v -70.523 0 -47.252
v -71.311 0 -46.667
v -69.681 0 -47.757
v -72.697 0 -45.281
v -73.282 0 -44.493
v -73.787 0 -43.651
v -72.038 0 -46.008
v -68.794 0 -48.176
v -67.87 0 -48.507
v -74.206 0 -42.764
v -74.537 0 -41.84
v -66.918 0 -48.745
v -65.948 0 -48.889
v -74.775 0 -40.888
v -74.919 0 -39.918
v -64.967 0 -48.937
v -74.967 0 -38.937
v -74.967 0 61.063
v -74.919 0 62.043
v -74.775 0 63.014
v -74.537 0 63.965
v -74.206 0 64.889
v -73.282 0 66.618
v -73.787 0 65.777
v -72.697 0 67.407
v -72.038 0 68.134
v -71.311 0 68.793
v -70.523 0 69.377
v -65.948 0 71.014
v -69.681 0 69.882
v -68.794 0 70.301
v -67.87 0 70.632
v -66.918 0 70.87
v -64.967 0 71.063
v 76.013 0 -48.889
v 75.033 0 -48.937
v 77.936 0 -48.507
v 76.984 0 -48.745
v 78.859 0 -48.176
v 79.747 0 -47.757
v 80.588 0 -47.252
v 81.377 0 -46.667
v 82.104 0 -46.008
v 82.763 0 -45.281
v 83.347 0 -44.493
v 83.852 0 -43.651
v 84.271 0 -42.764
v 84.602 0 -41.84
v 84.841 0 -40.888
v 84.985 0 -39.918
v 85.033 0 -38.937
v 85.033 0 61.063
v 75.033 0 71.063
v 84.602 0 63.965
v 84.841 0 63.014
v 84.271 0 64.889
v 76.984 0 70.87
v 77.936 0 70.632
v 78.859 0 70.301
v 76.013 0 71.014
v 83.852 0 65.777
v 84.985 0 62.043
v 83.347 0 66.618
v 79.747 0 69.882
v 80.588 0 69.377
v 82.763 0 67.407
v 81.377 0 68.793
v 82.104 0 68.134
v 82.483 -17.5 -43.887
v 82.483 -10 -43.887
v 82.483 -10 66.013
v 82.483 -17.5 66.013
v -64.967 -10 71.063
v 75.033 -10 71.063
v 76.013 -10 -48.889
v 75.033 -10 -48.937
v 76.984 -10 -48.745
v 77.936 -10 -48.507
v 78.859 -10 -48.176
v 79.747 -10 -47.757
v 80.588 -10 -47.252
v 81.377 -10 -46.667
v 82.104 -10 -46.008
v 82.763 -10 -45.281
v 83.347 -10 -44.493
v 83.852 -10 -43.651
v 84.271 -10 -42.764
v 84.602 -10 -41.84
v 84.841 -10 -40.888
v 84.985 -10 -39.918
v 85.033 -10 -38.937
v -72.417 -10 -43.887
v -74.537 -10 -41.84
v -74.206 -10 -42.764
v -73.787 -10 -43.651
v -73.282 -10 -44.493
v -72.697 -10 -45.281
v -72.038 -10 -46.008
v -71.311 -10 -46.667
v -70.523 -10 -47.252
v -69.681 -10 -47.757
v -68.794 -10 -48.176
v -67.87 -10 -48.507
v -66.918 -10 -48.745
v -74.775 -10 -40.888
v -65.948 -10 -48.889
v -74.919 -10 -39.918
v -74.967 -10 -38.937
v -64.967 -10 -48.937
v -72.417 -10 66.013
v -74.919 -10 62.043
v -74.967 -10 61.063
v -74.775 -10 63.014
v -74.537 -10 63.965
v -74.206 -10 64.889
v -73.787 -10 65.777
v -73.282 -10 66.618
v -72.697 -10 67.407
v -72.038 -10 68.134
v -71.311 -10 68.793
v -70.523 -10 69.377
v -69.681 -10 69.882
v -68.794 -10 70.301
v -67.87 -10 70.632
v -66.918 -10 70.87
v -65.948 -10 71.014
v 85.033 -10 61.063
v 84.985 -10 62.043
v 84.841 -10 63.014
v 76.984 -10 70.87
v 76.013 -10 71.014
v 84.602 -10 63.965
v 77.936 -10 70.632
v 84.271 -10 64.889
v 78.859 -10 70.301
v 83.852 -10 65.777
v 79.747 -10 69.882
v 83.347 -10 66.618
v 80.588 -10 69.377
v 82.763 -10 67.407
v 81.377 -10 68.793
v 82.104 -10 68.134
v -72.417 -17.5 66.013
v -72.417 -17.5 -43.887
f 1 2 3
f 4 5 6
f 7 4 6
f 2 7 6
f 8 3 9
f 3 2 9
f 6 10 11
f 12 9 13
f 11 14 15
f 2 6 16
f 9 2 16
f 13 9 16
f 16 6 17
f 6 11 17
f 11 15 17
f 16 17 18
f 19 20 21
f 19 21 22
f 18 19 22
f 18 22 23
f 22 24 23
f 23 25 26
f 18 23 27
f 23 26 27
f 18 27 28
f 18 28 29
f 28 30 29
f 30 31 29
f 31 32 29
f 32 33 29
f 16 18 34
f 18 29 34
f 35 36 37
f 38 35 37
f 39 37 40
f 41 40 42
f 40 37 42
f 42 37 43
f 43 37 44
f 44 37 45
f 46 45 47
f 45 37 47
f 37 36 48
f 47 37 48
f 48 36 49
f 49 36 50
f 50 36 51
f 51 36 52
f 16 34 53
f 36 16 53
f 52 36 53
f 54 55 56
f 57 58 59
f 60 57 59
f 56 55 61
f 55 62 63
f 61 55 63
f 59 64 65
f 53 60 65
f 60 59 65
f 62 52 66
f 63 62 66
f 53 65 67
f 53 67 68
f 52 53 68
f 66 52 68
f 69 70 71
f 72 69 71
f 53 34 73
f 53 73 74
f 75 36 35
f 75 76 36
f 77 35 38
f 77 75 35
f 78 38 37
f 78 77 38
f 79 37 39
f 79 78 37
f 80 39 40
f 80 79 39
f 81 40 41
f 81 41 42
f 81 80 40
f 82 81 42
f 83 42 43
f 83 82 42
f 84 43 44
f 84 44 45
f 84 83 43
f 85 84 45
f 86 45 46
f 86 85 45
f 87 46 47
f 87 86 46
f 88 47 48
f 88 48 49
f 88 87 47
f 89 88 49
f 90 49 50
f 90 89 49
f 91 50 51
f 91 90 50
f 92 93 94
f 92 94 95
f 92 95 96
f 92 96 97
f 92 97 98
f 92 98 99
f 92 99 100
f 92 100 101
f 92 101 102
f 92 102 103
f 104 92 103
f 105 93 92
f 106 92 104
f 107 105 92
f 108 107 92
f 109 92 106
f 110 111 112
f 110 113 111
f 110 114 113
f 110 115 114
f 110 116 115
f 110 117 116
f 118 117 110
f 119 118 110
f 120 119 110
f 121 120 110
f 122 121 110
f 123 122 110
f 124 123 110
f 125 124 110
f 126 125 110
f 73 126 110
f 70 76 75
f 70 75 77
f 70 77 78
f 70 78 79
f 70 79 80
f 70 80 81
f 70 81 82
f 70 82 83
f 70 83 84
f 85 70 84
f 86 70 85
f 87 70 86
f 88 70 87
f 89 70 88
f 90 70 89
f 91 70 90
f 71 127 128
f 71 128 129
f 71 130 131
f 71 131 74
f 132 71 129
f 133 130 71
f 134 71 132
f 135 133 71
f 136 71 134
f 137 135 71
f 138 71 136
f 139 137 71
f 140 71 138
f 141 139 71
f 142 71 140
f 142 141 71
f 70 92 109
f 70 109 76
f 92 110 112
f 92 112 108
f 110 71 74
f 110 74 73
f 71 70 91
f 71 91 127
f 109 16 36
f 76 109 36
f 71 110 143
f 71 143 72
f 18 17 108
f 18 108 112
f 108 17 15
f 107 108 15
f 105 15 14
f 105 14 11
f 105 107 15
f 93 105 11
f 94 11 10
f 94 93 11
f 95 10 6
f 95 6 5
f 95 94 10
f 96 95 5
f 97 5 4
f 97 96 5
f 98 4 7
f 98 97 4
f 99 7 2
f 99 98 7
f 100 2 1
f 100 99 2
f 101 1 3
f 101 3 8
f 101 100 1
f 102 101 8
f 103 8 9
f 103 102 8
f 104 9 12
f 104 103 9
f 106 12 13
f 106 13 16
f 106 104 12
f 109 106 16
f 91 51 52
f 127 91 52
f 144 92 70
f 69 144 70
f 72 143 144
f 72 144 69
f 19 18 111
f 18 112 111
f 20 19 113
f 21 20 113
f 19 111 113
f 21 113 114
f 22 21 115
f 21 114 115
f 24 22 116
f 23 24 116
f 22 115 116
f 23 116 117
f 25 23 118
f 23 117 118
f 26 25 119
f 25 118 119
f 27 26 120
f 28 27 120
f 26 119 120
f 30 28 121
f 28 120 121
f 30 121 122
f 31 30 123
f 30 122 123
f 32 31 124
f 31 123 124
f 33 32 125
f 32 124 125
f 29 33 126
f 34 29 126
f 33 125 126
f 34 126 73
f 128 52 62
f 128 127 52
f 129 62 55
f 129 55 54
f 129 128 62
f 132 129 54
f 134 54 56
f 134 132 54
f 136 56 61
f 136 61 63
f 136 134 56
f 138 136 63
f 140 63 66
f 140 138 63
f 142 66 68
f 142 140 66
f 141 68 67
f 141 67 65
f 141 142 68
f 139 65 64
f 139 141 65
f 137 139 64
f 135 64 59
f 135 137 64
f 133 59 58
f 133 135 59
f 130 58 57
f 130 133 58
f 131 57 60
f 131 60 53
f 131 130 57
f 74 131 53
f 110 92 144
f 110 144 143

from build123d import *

# Parameters (mm, degrees)
F0_W     = 160
F0_H     = 120
F1_DEPTH = 10
F2_R     = 10
F3_W     = 154.9
F3_H     = 109.9
F4_DEPTH = 7.5


with BuildPart() as f1:
    # F0 (on Front) → F1 (new body)
    with BuildSketch(Plane.XZ):
        with Locations((5.032664, 11.062619)):
            Rectangle(F0_W, F0_H)
    extrude(amount=F1_DEPTH)

    # F2
    f2_edges = [f1.edges().sort_by_distance(p)[0] for p in [
        (-74.967336, -5, 71.062619),
        (-74.967336, -5, -48.937381),
        (85.032664, -5, 71.062619),
        (85.032664, -5, -48.937381),
    ]]
    fillet(f2_edges, radius=F2_R)

    # F3 (on face) → F4 (join)
    with BuildSketch(Plane.XZ.offset(10)):
        with Locations((5.032664, 11.062619)):
            Rectangle(F3_W, F3_H)
    extrude(amount=F4_DEPTH)


solid = f1.part
